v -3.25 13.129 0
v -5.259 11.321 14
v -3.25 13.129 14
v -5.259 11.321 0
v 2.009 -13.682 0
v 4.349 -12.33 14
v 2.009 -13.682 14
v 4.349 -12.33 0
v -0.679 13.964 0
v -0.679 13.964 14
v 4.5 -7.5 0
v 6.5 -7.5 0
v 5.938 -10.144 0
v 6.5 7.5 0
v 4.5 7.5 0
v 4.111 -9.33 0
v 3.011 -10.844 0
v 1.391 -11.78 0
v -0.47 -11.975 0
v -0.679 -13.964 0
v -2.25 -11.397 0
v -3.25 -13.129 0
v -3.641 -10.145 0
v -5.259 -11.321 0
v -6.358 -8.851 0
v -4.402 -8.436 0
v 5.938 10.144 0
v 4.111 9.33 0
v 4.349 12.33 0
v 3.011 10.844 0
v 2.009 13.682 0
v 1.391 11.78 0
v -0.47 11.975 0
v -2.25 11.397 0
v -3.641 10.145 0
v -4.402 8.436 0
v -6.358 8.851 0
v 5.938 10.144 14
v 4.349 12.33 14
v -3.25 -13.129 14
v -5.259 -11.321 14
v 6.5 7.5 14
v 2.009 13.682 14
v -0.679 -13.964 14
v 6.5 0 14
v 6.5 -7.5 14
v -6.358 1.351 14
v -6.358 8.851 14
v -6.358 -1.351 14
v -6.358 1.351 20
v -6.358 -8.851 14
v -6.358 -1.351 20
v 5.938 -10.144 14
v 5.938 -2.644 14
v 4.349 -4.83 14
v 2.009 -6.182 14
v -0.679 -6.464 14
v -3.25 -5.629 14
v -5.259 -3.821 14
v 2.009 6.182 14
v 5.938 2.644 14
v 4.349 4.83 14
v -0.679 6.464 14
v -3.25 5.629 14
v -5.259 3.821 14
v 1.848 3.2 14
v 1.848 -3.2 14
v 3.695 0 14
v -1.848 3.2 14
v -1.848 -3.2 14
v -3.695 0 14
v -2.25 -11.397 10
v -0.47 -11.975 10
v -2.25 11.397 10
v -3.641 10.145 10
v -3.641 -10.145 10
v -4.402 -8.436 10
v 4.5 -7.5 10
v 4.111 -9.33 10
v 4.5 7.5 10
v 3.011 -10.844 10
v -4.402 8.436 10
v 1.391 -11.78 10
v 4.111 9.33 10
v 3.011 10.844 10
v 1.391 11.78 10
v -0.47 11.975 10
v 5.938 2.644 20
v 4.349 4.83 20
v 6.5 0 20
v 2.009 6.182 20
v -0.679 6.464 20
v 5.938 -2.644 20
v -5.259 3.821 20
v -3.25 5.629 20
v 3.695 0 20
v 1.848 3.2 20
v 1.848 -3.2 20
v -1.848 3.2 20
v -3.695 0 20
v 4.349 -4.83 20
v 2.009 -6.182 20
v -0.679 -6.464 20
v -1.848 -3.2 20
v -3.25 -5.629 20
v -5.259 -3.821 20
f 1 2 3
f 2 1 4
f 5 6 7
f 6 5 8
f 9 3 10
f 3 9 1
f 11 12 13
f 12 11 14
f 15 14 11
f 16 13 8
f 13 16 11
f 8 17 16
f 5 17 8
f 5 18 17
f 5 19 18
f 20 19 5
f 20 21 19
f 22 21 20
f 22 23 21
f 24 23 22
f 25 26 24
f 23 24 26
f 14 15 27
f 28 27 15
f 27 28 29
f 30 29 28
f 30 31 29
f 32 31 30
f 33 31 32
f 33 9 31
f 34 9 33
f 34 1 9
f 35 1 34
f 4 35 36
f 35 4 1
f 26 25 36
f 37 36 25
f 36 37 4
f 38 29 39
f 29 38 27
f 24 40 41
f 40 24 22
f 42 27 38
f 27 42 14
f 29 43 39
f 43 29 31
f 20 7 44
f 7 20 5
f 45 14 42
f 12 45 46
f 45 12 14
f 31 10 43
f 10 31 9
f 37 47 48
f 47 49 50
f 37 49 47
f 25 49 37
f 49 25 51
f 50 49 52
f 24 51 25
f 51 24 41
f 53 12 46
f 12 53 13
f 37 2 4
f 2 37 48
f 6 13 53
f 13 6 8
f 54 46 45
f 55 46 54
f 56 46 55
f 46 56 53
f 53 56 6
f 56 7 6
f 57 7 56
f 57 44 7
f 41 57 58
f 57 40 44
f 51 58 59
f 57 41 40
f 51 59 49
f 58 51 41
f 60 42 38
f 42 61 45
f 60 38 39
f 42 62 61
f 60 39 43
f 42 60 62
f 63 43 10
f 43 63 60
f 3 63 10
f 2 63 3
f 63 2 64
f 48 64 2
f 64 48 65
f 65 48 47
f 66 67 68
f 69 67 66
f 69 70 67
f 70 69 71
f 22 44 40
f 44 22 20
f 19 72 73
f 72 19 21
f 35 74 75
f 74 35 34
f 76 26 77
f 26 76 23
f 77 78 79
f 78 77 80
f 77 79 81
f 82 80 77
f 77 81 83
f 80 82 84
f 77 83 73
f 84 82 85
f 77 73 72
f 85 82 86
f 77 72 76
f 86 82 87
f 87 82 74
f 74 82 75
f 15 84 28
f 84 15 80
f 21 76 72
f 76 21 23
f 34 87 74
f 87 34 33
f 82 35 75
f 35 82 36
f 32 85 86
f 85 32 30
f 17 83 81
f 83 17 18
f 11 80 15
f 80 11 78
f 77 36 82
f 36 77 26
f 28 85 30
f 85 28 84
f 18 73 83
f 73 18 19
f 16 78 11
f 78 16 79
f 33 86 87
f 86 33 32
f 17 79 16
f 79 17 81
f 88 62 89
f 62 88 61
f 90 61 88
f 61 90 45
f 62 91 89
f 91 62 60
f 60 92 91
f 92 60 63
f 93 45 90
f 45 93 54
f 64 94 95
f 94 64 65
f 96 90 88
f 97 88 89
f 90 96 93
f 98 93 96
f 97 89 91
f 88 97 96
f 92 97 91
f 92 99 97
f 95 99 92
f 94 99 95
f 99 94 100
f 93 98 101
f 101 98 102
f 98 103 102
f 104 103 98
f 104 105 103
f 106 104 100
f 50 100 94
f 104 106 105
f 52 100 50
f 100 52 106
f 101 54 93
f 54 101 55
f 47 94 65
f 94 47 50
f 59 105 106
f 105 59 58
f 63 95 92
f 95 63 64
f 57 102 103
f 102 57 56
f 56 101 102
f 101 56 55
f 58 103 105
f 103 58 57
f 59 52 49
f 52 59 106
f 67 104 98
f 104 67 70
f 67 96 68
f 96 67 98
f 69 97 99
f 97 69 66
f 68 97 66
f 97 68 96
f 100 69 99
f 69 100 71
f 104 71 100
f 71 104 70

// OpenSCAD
xsize=9;

ysize=24;

wall=4;

hexhead=6.4;


heigh=10;

module hexheadpin(){
    $fn=6;
    cylinder(r=hexhead/(2*cos(30)),h=2*heigh);
    
    
}




module box(){
    $fn=15;
    
    union(){
    difference(){

        hull(){
            translate([0,(ysize-xsize)/2,0])cylinder(r=(wall+xsize)/2,h=heigh+wall);
            translate([0,-(ysize-xsize)/2,0])cylinder(r=(wall+xsize)/2,h=heigh+wall);    
        }
        hull(){
            translate([0,(ysize-xsize)/2,0])cylinder(r=xsize/2,h=heigh);
            translate([0,-(ysize-xsize)/2,0])cylinder(r=xsize/2,h=heigh);    
        }
    }
    
    difference(){
        translate([0,0,heigh+wall])cylinder(r=(wall+xsize)/2,h=2*heigh-(heigh+wall));
        hexheadpin();
    }
}
        
}   
    
    
box();
